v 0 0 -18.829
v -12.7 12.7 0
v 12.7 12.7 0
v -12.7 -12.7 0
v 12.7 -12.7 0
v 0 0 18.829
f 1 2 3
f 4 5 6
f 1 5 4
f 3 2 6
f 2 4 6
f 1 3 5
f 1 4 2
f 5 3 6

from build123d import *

# Parameters (mm, degrees)
F0_W      = 25.4
F0_H      = 25.4
F1_DEPTH  = 29.464
F1_TAPER  = 34
F1_FACE_W = 25.4
F1_FACE_H = 25.4


# Not quite as in the source:
# - an extrude whose draft closes it to a point is written as a loft to that point


with BuildPart() as f1:
    # F0 (on Top) → F1 (new body)
    with BuildSketch(Plane.XY):
        Rectangle(F0_W, F0_H)
    extrude(amount=F1_DEPTH, taper=F1_TAPER)

    # F1_face (on face) → F2 section 0
    with BuildSketch(Plane(origin=(0, 0, 0), x_dir=(1, 0, 0), z_dir=(0, 0, -1)), mode=Mode.PRIVATE) as f2_s0:
        Rectangle(F1_FACE_W, F1_FACE_H)
    loft([f2_s0.sketch, Vertex(0, 0, -18.8285243001)], ruled=True)


solid = f1.part
